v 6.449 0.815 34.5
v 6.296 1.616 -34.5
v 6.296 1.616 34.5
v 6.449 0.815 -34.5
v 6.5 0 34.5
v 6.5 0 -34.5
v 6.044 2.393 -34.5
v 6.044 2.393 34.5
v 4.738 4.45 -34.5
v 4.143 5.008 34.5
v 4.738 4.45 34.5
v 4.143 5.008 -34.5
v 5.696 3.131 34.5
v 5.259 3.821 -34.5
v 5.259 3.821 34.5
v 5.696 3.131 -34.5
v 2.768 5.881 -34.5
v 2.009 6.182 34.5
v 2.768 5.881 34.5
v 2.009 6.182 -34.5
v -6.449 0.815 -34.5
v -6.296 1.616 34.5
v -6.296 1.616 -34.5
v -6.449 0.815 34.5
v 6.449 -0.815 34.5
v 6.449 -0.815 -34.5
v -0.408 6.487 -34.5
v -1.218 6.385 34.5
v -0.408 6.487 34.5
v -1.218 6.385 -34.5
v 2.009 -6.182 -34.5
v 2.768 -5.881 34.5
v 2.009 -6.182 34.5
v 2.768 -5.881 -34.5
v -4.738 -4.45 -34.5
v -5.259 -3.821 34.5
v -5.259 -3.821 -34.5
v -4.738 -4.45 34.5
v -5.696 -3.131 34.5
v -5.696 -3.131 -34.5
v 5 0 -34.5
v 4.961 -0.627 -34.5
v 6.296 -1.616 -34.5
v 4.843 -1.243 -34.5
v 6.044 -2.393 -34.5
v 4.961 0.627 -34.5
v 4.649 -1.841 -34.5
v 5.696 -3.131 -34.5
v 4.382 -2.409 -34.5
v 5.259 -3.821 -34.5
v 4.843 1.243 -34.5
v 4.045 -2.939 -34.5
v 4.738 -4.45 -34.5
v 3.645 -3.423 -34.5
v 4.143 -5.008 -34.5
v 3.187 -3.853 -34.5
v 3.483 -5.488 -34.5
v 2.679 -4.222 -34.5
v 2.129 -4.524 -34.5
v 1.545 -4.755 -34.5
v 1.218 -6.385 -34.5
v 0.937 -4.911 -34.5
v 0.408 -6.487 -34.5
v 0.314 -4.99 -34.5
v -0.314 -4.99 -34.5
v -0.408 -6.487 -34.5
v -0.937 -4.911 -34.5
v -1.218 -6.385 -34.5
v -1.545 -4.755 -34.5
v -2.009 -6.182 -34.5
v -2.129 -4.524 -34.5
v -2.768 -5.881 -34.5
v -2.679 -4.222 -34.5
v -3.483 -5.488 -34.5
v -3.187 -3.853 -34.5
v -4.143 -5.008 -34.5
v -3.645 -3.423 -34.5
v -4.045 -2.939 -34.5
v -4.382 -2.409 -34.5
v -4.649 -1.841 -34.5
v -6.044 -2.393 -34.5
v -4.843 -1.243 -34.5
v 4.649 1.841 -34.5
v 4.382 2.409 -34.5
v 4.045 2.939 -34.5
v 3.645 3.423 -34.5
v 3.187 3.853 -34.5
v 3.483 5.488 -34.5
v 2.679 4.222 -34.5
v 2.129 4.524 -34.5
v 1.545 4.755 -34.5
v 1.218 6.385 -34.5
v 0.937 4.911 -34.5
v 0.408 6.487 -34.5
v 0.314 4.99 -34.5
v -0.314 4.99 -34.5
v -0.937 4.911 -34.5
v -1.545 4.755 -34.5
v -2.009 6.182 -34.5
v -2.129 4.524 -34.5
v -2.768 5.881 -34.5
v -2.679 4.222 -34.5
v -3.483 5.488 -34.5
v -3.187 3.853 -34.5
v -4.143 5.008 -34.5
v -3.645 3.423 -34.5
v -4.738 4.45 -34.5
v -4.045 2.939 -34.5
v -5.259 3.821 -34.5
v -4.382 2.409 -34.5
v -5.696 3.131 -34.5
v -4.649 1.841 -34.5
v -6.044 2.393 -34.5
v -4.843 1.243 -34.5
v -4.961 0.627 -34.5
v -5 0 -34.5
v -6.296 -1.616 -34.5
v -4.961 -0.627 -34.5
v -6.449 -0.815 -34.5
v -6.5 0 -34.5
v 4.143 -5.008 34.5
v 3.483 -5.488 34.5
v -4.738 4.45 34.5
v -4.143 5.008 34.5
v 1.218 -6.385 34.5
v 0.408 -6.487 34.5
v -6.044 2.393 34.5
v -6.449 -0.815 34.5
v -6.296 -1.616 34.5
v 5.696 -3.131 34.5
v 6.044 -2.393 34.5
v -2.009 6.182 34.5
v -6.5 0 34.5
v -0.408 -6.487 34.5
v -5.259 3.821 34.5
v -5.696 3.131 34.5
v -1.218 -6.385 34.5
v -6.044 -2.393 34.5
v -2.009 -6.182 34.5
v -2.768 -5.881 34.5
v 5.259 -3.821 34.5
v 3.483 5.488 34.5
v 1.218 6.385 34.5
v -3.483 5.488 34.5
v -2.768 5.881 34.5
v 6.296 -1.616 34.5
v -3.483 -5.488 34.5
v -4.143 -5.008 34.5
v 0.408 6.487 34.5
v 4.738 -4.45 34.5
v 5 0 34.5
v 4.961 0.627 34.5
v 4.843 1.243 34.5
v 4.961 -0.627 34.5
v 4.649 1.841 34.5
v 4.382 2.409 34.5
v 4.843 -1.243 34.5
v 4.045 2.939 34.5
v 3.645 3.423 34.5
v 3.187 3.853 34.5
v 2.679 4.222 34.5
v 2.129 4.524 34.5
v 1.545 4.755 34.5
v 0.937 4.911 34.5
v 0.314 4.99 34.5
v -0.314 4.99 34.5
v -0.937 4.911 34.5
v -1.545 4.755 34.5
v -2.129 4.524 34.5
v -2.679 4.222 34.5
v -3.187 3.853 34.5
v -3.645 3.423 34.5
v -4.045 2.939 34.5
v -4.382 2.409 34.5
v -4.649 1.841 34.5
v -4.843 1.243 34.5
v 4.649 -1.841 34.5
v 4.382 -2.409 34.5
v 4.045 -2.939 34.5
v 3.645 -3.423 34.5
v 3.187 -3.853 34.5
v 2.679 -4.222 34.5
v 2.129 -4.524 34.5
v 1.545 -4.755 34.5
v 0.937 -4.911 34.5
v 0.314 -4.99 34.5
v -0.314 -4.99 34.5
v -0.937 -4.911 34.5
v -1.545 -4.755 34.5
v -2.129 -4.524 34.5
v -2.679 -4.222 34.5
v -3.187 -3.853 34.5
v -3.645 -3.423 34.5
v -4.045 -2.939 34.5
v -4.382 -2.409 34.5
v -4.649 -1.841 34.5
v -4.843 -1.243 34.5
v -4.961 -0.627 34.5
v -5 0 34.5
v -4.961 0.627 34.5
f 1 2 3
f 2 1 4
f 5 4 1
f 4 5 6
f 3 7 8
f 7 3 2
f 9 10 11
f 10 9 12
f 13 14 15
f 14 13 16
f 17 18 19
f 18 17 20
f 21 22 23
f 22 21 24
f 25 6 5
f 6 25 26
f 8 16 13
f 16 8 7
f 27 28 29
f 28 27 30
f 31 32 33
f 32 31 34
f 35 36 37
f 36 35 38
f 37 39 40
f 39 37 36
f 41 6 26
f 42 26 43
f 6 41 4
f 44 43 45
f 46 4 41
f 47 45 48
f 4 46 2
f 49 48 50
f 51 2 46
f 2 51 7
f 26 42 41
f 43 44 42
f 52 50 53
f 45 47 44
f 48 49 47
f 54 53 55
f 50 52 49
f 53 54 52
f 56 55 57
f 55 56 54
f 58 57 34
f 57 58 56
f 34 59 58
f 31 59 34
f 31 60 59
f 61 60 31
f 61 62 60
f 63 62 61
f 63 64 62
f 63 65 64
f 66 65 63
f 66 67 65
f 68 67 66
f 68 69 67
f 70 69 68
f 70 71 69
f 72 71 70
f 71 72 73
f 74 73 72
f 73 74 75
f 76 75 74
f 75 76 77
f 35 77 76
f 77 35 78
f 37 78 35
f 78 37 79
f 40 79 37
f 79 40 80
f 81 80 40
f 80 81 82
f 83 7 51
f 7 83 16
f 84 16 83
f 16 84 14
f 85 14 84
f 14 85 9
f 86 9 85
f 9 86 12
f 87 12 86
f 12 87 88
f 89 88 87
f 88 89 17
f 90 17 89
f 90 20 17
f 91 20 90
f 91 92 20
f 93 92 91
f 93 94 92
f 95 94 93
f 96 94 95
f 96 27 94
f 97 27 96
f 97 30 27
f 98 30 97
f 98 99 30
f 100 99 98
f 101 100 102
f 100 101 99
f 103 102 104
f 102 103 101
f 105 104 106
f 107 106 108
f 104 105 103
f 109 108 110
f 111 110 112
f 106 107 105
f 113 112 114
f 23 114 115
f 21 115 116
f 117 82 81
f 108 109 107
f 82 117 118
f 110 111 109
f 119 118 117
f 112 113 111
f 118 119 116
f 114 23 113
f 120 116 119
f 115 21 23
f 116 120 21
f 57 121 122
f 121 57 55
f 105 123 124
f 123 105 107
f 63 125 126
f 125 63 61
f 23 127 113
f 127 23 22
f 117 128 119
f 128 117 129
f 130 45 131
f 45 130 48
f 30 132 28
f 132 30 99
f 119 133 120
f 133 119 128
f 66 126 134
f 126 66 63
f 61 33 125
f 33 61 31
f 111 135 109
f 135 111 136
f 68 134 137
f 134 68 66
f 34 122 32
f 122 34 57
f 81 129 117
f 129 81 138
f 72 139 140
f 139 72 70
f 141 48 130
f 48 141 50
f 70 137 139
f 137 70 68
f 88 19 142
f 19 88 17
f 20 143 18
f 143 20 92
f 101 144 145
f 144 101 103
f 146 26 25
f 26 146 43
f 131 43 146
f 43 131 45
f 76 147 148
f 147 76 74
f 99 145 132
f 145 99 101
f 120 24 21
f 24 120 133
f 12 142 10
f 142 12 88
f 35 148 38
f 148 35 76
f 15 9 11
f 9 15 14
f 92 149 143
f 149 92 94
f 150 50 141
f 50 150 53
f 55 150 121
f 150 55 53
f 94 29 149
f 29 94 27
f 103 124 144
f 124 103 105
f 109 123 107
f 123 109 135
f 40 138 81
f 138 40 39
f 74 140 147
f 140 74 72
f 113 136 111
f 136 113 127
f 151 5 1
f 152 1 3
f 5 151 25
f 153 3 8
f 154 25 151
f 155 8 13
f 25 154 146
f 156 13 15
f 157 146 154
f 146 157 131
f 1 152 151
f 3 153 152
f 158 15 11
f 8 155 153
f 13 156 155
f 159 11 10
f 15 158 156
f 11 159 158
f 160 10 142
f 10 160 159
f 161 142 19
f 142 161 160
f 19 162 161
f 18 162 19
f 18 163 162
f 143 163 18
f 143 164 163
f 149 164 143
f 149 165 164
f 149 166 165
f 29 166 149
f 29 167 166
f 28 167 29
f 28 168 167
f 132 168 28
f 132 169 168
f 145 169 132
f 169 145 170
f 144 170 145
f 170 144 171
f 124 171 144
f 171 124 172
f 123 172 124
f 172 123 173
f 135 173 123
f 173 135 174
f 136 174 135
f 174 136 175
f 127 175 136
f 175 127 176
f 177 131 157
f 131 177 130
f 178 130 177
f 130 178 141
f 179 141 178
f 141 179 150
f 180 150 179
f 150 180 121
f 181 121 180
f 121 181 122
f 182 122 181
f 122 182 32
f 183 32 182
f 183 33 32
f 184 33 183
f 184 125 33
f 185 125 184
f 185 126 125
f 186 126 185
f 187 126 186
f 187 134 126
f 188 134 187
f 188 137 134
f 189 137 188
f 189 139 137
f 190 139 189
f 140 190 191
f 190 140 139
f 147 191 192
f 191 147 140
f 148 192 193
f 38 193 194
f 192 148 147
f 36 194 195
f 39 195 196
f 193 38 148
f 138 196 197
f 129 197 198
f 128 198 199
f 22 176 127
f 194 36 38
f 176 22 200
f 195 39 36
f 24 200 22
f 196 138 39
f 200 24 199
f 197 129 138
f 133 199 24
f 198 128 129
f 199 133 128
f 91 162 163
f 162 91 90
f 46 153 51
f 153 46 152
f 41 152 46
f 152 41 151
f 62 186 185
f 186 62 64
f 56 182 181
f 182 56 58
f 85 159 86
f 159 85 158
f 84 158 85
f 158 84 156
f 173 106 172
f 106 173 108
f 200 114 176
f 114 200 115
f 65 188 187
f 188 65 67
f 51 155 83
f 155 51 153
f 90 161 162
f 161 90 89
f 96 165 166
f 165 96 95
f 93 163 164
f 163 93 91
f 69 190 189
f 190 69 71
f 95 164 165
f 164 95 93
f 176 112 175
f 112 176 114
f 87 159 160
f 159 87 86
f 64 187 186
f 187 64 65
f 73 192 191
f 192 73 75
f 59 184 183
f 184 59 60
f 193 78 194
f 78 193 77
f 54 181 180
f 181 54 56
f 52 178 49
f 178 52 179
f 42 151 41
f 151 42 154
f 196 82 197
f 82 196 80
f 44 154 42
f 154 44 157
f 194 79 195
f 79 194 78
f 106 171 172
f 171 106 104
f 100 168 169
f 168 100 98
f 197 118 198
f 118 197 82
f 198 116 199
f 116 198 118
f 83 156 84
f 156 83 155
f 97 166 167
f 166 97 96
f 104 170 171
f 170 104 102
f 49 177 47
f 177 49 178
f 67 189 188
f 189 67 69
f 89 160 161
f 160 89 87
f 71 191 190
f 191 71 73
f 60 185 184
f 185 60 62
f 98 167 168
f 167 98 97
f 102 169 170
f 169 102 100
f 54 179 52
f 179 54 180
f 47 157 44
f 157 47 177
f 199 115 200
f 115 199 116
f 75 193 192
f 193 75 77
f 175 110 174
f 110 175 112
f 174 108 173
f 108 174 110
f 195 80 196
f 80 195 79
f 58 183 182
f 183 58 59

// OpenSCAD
$fn = 50;


difference() {
	union() {
		translate(v = [0, 0, -34.5000000000]) {
			cylinder(h = 69, r = 6.5000000000);
		}
	}
	union() {
		translate(v = [0, 0, -100.0000000000]) {
			cylinder(h = 200, r = 5.0000000000);
		}
	}
}
